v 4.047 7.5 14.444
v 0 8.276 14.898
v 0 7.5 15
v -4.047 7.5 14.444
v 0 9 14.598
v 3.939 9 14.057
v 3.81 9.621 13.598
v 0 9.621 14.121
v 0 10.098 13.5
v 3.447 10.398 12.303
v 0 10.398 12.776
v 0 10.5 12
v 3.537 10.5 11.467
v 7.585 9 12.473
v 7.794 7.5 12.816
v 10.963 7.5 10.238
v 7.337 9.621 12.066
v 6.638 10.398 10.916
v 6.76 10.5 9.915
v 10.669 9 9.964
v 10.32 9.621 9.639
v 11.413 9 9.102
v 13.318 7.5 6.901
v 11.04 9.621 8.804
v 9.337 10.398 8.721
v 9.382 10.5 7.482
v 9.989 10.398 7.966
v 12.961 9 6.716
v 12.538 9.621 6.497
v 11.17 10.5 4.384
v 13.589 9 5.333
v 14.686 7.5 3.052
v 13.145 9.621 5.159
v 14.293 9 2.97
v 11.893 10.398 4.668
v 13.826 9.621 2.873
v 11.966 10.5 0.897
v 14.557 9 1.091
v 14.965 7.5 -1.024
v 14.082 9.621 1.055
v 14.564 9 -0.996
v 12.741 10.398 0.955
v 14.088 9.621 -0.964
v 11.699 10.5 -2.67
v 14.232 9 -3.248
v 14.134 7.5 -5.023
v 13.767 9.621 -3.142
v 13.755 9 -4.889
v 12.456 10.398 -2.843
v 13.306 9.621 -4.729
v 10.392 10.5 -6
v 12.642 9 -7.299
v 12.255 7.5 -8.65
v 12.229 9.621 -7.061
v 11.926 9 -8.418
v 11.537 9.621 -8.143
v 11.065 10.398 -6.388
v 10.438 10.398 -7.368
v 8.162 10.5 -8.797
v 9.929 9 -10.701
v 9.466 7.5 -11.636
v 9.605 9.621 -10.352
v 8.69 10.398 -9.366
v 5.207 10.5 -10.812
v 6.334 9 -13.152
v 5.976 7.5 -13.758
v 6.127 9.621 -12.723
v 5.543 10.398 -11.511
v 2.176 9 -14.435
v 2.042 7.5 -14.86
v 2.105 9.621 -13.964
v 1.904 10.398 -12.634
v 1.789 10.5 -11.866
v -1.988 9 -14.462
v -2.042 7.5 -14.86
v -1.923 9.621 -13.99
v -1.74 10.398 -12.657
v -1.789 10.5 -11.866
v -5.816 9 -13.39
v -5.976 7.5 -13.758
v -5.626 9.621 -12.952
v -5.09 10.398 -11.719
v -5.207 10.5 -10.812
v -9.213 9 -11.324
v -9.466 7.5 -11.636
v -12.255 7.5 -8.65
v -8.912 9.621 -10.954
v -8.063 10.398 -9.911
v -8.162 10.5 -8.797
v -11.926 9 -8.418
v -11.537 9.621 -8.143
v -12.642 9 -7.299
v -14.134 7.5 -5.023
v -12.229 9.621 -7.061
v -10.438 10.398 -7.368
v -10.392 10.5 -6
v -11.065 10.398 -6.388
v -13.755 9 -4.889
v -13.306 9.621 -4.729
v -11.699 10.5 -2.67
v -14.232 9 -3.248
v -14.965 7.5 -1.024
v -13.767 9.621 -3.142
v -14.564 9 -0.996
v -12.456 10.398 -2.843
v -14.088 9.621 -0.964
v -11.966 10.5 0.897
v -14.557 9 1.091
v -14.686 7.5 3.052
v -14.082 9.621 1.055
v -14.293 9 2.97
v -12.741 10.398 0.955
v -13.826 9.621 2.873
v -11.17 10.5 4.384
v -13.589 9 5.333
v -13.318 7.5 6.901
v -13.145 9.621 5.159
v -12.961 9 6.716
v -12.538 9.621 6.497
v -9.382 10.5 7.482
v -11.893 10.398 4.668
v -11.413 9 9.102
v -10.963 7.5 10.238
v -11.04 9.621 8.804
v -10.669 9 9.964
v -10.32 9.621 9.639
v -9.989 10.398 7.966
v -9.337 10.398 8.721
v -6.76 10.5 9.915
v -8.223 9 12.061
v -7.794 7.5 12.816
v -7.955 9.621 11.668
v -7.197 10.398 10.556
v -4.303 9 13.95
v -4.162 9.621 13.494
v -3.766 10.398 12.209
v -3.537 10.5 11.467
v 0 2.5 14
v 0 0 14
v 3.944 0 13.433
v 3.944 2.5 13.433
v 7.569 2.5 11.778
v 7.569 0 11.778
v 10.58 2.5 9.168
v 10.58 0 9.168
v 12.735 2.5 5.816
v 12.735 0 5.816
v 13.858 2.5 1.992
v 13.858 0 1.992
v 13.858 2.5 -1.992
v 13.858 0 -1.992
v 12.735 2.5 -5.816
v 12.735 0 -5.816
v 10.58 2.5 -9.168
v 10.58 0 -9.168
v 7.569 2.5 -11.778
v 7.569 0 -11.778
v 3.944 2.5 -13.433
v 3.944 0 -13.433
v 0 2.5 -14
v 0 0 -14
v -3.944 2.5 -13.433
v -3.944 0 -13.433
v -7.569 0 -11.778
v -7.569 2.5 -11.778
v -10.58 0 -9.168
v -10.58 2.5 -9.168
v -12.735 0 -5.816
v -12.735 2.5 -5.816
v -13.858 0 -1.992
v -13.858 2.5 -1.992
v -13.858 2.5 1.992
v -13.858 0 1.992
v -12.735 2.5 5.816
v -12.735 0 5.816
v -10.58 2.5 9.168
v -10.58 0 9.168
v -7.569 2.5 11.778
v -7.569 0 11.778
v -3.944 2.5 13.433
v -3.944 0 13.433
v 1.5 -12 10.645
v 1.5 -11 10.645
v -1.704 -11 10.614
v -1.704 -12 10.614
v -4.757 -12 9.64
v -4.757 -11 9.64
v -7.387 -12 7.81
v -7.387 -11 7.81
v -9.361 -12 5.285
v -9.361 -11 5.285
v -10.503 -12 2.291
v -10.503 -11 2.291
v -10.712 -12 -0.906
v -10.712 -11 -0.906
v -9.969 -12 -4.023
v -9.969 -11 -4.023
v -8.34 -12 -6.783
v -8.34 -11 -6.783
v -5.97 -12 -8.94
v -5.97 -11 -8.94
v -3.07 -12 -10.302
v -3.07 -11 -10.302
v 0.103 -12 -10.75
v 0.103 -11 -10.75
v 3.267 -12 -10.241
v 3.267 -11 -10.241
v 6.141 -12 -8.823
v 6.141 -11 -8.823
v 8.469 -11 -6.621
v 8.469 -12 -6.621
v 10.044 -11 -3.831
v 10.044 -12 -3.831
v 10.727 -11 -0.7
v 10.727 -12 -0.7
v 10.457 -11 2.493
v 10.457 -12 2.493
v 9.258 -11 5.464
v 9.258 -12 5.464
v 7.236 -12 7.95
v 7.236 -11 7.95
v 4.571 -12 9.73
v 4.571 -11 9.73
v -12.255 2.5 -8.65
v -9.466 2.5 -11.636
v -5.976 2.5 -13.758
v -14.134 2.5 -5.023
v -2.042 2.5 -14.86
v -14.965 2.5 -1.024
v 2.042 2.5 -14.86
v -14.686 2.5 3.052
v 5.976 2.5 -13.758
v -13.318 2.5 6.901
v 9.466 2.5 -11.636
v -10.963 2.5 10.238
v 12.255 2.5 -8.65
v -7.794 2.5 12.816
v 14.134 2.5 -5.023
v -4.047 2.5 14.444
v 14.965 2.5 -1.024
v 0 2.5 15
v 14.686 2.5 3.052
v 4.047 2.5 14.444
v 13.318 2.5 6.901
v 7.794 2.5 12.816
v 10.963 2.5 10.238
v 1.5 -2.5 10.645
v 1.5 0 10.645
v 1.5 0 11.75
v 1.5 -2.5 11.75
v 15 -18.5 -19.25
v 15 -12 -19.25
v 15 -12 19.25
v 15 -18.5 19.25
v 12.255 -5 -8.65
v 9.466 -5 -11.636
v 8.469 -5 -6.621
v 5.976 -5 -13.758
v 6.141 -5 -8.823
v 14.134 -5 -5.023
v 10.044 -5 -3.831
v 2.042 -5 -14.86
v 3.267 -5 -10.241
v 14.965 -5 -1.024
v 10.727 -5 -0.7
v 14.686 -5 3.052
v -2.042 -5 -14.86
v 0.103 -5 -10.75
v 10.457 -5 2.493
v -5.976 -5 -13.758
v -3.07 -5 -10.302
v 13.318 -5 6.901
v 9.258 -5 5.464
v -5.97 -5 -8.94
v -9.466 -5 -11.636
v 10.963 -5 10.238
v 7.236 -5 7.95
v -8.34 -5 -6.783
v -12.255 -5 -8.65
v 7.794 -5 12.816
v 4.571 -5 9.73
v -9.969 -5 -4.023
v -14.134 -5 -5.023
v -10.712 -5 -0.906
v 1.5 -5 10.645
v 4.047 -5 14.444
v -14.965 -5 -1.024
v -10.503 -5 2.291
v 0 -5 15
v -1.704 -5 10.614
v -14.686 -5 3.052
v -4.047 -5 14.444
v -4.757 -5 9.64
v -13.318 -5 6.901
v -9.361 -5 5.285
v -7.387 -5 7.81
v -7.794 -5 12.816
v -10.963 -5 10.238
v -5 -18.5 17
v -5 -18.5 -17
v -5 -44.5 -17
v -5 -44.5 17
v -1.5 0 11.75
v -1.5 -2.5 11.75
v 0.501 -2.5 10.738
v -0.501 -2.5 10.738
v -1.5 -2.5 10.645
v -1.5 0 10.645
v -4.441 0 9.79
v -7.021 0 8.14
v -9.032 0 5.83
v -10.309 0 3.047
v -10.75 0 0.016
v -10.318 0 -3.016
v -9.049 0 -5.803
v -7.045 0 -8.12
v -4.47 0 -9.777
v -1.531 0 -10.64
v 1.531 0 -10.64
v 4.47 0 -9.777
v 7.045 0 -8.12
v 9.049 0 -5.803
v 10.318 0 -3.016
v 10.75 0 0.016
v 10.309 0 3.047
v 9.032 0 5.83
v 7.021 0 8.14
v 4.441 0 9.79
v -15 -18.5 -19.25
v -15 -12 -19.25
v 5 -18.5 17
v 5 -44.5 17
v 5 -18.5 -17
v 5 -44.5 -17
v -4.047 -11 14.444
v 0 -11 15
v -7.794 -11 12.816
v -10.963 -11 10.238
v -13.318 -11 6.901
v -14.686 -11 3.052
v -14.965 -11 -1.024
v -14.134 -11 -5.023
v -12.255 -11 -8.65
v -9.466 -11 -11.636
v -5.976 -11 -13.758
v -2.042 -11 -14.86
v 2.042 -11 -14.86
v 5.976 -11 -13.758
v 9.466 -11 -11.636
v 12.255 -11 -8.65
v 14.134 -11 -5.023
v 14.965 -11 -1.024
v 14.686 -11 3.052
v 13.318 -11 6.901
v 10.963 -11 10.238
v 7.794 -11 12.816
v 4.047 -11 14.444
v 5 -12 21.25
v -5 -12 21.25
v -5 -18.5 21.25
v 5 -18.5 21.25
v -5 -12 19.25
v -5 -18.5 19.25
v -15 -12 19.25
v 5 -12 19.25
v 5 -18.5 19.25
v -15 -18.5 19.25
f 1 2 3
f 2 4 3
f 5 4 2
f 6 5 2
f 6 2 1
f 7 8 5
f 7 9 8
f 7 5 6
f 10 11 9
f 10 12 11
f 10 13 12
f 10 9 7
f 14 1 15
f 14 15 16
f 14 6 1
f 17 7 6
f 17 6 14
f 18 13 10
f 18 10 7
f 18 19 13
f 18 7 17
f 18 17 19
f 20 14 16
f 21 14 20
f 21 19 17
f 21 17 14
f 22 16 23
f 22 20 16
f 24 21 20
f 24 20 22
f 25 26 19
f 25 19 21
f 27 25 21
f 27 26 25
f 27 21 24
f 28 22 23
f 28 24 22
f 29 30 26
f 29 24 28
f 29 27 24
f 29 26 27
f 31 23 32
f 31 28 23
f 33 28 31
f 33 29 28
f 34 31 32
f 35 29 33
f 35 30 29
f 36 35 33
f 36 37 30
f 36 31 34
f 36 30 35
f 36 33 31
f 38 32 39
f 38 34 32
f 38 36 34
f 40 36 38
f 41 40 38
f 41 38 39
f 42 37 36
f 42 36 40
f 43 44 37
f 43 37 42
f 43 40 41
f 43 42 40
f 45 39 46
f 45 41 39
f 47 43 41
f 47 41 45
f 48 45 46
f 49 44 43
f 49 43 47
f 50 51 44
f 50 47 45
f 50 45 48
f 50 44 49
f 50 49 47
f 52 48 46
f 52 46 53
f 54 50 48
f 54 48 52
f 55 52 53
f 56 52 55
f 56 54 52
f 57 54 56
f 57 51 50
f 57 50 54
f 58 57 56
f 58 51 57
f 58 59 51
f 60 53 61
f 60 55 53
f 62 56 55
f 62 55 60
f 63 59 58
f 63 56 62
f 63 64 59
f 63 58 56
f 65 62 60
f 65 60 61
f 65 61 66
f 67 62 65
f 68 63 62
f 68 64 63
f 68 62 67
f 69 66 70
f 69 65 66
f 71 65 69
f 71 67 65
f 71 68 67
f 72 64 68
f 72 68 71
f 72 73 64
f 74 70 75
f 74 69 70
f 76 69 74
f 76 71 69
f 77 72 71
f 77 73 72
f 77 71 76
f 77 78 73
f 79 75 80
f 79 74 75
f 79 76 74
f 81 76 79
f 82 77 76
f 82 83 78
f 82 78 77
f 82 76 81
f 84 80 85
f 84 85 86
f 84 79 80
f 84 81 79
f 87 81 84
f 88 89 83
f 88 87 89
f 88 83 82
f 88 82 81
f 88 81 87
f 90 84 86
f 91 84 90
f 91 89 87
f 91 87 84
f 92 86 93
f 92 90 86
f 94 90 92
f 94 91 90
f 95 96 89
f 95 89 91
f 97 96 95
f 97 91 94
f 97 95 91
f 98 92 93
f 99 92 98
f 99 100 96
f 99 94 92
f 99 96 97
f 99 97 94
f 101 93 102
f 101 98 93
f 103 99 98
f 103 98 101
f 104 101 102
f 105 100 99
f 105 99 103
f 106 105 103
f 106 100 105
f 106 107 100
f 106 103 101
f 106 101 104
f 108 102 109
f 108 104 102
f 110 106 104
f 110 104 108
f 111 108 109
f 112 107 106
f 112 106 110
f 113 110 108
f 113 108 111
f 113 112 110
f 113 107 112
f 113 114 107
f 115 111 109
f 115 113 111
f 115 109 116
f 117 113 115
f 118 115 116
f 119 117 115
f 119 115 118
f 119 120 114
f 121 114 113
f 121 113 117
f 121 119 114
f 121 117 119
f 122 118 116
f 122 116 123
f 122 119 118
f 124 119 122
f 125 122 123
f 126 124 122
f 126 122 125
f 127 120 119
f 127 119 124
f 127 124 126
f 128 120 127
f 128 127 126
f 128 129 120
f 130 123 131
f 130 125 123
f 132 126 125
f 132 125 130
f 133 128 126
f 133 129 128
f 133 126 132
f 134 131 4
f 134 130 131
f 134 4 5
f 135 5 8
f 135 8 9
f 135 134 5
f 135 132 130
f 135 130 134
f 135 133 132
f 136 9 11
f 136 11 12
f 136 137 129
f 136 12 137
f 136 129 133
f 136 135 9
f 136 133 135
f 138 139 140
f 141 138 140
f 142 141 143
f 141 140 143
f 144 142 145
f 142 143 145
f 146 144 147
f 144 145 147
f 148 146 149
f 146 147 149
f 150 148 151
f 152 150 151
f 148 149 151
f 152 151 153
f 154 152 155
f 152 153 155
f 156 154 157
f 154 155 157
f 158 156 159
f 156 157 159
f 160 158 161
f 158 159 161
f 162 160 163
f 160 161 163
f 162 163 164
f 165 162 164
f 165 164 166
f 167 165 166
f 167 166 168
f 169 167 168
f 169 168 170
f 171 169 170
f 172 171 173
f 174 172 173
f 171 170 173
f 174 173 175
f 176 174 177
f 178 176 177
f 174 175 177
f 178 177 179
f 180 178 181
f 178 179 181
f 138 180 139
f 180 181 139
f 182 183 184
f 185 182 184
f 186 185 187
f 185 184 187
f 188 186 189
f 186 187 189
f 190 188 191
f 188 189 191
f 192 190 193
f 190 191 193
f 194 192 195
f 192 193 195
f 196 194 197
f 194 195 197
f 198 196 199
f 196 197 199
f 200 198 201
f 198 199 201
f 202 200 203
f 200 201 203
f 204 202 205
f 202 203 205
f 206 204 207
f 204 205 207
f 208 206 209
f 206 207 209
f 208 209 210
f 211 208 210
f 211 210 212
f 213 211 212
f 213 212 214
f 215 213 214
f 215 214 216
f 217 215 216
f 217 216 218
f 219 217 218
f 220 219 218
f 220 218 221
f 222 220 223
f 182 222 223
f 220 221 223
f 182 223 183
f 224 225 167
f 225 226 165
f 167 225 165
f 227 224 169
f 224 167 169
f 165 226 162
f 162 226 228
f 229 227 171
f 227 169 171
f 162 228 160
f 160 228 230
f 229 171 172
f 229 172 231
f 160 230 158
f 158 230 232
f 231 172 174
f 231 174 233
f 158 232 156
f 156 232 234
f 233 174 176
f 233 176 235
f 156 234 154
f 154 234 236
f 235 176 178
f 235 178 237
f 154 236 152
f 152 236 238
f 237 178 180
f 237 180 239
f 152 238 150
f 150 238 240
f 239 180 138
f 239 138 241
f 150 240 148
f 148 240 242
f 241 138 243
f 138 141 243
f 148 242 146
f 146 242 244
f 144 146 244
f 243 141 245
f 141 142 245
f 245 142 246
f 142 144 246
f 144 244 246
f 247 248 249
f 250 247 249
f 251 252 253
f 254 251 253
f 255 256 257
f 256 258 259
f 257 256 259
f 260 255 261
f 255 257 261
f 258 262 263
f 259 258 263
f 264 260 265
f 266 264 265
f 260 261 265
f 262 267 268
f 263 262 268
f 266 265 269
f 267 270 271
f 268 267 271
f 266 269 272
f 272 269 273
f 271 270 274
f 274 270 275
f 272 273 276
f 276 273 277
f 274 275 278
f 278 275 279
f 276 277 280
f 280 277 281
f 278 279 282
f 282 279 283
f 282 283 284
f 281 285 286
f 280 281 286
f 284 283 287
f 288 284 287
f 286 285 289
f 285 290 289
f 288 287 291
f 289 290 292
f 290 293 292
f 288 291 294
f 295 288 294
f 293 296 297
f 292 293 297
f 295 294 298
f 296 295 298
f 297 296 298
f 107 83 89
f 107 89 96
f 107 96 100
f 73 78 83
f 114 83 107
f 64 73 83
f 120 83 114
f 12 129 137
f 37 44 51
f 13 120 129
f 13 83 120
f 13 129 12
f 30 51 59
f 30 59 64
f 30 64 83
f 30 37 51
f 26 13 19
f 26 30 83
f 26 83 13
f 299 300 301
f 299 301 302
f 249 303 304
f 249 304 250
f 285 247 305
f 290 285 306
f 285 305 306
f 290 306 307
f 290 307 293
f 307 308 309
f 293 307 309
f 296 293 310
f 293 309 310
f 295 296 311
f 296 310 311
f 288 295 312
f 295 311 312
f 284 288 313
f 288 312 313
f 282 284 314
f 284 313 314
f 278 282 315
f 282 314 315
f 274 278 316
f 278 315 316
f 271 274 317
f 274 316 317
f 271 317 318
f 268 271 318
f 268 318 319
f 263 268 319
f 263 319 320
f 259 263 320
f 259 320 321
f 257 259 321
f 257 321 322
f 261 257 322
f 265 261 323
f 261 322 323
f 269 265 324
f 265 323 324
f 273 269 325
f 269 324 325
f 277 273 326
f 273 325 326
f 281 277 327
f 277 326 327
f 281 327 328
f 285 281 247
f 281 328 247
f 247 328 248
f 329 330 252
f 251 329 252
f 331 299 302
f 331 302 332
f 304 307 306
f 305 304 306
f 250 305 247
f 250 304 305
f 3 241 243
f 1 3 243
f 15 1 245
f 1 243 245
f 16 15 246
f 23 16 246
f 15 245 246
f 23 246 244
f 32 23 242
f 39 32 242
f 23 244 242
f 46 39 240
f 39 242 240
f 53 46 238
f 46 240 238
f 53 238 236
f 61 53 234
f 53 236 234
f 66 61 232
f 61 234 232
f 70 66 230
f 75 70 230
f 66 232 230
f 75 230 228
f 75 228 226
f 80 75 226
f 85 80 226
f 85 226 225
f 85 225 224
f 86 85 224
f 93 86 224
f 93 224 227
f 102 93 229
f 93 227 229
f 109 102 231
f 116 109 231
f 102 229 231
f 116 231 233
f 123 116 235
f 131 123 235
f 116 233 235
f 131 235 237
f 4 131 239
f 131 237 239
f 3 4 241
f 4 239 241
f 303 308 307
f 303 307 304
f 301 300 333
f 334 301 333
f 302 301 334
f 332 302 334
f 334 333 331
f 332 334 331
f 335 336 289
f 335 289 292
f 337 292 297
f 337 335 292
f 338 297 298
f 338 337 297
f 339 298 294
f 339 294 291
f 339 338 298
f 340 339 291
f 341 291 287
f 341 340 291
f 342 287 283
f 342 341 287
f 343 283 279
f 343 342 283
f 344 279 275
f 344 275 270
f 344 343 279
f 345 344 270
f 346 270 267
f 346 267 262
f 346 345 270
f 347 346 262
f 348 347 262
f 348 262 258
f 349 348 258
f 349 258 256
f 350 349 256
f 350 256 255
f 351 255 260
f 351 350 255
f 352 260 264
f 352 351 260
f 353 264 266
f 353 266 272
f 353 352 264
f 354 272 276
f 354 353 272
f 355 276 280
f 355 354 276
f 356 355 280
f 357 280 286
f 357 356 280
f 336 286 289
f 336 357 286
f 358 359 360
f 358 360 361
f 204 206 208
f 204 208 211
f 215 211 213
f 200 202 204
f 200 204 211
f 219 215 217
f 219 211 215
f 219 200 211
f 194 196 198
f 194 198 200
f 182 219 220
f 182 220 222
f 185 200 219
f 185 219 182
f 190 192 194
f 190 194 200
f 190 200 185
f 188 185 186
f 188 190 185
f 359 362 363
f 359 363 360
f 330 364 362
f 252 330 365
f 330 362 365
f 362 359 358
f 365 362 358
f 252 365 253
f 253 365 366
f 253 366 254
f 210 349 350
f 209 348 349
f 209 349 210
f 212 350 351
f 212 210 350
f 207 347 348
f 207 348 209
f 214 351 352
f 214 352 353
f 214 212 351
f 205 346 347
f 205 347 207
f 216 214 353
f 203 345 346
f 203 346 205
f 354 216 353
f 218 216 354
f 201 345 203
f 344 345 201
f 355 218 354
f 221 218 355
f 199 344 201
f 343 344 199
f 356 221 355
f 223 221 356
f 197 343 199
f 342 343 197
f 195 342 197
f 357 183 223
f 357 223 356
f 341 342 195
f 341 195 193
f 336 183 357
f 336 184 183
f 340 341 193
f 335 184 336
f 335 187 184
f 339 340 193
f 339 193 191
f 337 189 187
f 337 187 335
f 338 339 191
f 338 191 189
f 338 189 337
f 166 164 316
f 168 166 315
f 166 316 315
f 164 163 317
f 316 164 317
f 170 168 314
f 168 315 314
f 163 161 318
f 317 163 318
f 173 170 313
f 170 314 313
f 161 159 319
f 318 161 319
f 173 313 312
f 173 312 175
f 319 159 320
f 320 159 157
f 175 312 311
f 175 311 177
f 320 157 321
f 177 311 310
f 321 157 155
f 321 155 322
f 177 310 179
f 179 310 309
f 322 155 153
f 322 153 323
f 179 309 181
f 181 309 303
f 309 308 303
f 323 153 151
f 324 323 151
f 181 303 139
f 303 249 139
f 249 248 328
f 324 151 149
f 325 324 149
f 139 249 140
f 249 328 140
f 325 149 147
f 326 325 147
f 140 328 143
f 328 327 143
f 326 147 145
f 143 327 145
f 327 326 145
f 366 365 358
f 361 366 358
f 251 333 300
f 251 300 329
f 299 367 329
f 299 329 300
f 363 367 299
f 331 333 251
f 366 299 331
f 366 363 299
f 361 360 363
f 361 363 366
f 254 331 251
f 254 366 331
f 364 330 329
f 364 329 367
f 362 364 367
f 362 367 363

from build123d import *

# Parameters (mm, degrees)
SKIZZE1_R                       = 14
AUFSATZ_LINEAR_AUSTRAGEN1_DEPTH = 2.5
SKIZZE2_R                       = 15
AUFSATZ_LINEAR_AUSTRAGEN2_DEPTH = 8
VERRUNDUNG1_R                   = 3
SKIZZE3_R                       = 10.75
SKIZZE3_W                       = 3
SKIZZE3_H                       = 2
AUFSATZ_LINEAR_AUSTRAGEN3_DEPTH = 2.5
SKIZZE4_R                       = 10.75
AUFSATZ_LINEAR_AUSTRAGEN4_DEPTH = 2.5
AUFSATZ_LINEAR_START            = 6
SKIZZE5_R                       = 15
AUFSATZ_LINEAR_AUSTRAGEN5_DEPTH = 6
SKIZZE6_R                       = 10.75
AUFSATZ_LINEAR_AUSTRAGEN6_DEPTH = 1
SKIZZE7_W                       = 30
SKIZZE7_H                       = 38.5
SKIZZE7_W_2                     = 10
SKIZZE7_H_2                     = 4
AUFSATZ_LINEAR_AUSTRAGEN7_DEPTH = 6.5
SKIZZE8_W                       = 10
SKIZZE8_H                       = 34
AUFSATZ_LINEAR_AUSTRAGEN8_DEPTH = 26


with BuildPart() as part:
    # Skizze1 → Aufsatz-Linear austragen1 (new body)
    with BuildSketch(Plane(origin=(0, 0, 0), x_dir=(1, 0, 0), z_dir=(0, 1, 0))):
        with Locations(Location((0, 0, 0), (0, 0, 270))):
            Circle(SKIZZE1_R)
    extrude(amount=AUFSATZ_LINEAR_AUSTRAGEN1_DEPTH)

    # Skizze2 → Aufsatz-Linear austragen2 (add)
    with BuildSketch(Plane(origin=(0, 2.5, 0), x_dir=(1, 0, 0), z_dir=(0, 1, 0))):
        with Locations(Location((0, 0, 0), (0, 0, 270))):
            Circle(SKIZZE2_R)
    extrude(amount=AUFSATZ_LINEAR_AUSTRAGEN2_DEPTH)

    # Verrundung1
    verrundung1_edges = [part.edges().sort_by_distance(p)[0] for p in [
        (0, 10.5, -15),
    ]]
    fillet(verrundung1_edges, radius=VERRUNDUNG1_R)

    # Skizze3 → Aufsatz-Linear austragen3 (add)
    with BuildSketch(Plane.XZ):
        Circle(SKIZZE3_R)
        with Locations((0, 10.75)):
            Rectangle(SKIZZE3_W, SKIZZE3_H)
    extrude(amount=AUFSATZ_LINEAR_AUSTRAGEN3_DEPTH)

    # Skizze4 → Aufsatz-Linear austragen4 (add)
    with BuildSketch(Plane.XZ.offset(2.5)):
        with Locations(Location((0, 0, 0), (0, 0, 81.979067125))):
            Circle(SKIZZE4_R)
    extrude(amount=AUFSATZ_LINEAR_AUSTRAGEN4_DEPTH)

    # Skizze5 → Aufsatz-Linear austragen5 (add)
    with BuildSketch(Plane.XZ.offset(5).offset(AUFSATZ_LINEAR_START)):
        with Locations(Location((0, 0, 0), (0, 0, 90))):
            Circle(SKIZZE5_R)
    extrude(amount=-AUFSATZ_LINEAR_AUSTRAGEN5_DEPTH)

    # Skizze6 → Aufsatz-Linear austragen6 (add)
    with BuildSketch(Plane.XZ.offset(11)):
        with Locations(Location((0, 0, 0), (0, 0, 81.979067125))):
            Circle(SKIZZE6_R)
    extrude(amount=AUFSATZ_LINEAR_AUSTRAGEN6_DEPTH)


with BuildPart() as body_2:
    # Skizze7 → Aufsatz-Linear austragen7 (new body)
    with BuildSketch(Plane.XZ.offset(12)):
        Rectangle(SKIZZE7_W, SKIZZE7_H)
        with Locations((0, 19.25)):
            Rectangle(SKIZZE7_W_2, SKIZZE7_H_2)
    extrude(amount=AUFSATZ_LINEAR_AUSTRAGEN7_DEPTH)

    # Skizze8 → Aufsatz-Linear austragen8 (add)
    with BuildSketch(Plane.XZ.offset(18.5)):
        Rectangle(SKIZZE8_W, SKIZZE8_H)
    extrude(amount=AUFSATZ_LINEAR_AUSTRAGEN8_DEPTH)


solid = Compound([part.part, body_2.part])
